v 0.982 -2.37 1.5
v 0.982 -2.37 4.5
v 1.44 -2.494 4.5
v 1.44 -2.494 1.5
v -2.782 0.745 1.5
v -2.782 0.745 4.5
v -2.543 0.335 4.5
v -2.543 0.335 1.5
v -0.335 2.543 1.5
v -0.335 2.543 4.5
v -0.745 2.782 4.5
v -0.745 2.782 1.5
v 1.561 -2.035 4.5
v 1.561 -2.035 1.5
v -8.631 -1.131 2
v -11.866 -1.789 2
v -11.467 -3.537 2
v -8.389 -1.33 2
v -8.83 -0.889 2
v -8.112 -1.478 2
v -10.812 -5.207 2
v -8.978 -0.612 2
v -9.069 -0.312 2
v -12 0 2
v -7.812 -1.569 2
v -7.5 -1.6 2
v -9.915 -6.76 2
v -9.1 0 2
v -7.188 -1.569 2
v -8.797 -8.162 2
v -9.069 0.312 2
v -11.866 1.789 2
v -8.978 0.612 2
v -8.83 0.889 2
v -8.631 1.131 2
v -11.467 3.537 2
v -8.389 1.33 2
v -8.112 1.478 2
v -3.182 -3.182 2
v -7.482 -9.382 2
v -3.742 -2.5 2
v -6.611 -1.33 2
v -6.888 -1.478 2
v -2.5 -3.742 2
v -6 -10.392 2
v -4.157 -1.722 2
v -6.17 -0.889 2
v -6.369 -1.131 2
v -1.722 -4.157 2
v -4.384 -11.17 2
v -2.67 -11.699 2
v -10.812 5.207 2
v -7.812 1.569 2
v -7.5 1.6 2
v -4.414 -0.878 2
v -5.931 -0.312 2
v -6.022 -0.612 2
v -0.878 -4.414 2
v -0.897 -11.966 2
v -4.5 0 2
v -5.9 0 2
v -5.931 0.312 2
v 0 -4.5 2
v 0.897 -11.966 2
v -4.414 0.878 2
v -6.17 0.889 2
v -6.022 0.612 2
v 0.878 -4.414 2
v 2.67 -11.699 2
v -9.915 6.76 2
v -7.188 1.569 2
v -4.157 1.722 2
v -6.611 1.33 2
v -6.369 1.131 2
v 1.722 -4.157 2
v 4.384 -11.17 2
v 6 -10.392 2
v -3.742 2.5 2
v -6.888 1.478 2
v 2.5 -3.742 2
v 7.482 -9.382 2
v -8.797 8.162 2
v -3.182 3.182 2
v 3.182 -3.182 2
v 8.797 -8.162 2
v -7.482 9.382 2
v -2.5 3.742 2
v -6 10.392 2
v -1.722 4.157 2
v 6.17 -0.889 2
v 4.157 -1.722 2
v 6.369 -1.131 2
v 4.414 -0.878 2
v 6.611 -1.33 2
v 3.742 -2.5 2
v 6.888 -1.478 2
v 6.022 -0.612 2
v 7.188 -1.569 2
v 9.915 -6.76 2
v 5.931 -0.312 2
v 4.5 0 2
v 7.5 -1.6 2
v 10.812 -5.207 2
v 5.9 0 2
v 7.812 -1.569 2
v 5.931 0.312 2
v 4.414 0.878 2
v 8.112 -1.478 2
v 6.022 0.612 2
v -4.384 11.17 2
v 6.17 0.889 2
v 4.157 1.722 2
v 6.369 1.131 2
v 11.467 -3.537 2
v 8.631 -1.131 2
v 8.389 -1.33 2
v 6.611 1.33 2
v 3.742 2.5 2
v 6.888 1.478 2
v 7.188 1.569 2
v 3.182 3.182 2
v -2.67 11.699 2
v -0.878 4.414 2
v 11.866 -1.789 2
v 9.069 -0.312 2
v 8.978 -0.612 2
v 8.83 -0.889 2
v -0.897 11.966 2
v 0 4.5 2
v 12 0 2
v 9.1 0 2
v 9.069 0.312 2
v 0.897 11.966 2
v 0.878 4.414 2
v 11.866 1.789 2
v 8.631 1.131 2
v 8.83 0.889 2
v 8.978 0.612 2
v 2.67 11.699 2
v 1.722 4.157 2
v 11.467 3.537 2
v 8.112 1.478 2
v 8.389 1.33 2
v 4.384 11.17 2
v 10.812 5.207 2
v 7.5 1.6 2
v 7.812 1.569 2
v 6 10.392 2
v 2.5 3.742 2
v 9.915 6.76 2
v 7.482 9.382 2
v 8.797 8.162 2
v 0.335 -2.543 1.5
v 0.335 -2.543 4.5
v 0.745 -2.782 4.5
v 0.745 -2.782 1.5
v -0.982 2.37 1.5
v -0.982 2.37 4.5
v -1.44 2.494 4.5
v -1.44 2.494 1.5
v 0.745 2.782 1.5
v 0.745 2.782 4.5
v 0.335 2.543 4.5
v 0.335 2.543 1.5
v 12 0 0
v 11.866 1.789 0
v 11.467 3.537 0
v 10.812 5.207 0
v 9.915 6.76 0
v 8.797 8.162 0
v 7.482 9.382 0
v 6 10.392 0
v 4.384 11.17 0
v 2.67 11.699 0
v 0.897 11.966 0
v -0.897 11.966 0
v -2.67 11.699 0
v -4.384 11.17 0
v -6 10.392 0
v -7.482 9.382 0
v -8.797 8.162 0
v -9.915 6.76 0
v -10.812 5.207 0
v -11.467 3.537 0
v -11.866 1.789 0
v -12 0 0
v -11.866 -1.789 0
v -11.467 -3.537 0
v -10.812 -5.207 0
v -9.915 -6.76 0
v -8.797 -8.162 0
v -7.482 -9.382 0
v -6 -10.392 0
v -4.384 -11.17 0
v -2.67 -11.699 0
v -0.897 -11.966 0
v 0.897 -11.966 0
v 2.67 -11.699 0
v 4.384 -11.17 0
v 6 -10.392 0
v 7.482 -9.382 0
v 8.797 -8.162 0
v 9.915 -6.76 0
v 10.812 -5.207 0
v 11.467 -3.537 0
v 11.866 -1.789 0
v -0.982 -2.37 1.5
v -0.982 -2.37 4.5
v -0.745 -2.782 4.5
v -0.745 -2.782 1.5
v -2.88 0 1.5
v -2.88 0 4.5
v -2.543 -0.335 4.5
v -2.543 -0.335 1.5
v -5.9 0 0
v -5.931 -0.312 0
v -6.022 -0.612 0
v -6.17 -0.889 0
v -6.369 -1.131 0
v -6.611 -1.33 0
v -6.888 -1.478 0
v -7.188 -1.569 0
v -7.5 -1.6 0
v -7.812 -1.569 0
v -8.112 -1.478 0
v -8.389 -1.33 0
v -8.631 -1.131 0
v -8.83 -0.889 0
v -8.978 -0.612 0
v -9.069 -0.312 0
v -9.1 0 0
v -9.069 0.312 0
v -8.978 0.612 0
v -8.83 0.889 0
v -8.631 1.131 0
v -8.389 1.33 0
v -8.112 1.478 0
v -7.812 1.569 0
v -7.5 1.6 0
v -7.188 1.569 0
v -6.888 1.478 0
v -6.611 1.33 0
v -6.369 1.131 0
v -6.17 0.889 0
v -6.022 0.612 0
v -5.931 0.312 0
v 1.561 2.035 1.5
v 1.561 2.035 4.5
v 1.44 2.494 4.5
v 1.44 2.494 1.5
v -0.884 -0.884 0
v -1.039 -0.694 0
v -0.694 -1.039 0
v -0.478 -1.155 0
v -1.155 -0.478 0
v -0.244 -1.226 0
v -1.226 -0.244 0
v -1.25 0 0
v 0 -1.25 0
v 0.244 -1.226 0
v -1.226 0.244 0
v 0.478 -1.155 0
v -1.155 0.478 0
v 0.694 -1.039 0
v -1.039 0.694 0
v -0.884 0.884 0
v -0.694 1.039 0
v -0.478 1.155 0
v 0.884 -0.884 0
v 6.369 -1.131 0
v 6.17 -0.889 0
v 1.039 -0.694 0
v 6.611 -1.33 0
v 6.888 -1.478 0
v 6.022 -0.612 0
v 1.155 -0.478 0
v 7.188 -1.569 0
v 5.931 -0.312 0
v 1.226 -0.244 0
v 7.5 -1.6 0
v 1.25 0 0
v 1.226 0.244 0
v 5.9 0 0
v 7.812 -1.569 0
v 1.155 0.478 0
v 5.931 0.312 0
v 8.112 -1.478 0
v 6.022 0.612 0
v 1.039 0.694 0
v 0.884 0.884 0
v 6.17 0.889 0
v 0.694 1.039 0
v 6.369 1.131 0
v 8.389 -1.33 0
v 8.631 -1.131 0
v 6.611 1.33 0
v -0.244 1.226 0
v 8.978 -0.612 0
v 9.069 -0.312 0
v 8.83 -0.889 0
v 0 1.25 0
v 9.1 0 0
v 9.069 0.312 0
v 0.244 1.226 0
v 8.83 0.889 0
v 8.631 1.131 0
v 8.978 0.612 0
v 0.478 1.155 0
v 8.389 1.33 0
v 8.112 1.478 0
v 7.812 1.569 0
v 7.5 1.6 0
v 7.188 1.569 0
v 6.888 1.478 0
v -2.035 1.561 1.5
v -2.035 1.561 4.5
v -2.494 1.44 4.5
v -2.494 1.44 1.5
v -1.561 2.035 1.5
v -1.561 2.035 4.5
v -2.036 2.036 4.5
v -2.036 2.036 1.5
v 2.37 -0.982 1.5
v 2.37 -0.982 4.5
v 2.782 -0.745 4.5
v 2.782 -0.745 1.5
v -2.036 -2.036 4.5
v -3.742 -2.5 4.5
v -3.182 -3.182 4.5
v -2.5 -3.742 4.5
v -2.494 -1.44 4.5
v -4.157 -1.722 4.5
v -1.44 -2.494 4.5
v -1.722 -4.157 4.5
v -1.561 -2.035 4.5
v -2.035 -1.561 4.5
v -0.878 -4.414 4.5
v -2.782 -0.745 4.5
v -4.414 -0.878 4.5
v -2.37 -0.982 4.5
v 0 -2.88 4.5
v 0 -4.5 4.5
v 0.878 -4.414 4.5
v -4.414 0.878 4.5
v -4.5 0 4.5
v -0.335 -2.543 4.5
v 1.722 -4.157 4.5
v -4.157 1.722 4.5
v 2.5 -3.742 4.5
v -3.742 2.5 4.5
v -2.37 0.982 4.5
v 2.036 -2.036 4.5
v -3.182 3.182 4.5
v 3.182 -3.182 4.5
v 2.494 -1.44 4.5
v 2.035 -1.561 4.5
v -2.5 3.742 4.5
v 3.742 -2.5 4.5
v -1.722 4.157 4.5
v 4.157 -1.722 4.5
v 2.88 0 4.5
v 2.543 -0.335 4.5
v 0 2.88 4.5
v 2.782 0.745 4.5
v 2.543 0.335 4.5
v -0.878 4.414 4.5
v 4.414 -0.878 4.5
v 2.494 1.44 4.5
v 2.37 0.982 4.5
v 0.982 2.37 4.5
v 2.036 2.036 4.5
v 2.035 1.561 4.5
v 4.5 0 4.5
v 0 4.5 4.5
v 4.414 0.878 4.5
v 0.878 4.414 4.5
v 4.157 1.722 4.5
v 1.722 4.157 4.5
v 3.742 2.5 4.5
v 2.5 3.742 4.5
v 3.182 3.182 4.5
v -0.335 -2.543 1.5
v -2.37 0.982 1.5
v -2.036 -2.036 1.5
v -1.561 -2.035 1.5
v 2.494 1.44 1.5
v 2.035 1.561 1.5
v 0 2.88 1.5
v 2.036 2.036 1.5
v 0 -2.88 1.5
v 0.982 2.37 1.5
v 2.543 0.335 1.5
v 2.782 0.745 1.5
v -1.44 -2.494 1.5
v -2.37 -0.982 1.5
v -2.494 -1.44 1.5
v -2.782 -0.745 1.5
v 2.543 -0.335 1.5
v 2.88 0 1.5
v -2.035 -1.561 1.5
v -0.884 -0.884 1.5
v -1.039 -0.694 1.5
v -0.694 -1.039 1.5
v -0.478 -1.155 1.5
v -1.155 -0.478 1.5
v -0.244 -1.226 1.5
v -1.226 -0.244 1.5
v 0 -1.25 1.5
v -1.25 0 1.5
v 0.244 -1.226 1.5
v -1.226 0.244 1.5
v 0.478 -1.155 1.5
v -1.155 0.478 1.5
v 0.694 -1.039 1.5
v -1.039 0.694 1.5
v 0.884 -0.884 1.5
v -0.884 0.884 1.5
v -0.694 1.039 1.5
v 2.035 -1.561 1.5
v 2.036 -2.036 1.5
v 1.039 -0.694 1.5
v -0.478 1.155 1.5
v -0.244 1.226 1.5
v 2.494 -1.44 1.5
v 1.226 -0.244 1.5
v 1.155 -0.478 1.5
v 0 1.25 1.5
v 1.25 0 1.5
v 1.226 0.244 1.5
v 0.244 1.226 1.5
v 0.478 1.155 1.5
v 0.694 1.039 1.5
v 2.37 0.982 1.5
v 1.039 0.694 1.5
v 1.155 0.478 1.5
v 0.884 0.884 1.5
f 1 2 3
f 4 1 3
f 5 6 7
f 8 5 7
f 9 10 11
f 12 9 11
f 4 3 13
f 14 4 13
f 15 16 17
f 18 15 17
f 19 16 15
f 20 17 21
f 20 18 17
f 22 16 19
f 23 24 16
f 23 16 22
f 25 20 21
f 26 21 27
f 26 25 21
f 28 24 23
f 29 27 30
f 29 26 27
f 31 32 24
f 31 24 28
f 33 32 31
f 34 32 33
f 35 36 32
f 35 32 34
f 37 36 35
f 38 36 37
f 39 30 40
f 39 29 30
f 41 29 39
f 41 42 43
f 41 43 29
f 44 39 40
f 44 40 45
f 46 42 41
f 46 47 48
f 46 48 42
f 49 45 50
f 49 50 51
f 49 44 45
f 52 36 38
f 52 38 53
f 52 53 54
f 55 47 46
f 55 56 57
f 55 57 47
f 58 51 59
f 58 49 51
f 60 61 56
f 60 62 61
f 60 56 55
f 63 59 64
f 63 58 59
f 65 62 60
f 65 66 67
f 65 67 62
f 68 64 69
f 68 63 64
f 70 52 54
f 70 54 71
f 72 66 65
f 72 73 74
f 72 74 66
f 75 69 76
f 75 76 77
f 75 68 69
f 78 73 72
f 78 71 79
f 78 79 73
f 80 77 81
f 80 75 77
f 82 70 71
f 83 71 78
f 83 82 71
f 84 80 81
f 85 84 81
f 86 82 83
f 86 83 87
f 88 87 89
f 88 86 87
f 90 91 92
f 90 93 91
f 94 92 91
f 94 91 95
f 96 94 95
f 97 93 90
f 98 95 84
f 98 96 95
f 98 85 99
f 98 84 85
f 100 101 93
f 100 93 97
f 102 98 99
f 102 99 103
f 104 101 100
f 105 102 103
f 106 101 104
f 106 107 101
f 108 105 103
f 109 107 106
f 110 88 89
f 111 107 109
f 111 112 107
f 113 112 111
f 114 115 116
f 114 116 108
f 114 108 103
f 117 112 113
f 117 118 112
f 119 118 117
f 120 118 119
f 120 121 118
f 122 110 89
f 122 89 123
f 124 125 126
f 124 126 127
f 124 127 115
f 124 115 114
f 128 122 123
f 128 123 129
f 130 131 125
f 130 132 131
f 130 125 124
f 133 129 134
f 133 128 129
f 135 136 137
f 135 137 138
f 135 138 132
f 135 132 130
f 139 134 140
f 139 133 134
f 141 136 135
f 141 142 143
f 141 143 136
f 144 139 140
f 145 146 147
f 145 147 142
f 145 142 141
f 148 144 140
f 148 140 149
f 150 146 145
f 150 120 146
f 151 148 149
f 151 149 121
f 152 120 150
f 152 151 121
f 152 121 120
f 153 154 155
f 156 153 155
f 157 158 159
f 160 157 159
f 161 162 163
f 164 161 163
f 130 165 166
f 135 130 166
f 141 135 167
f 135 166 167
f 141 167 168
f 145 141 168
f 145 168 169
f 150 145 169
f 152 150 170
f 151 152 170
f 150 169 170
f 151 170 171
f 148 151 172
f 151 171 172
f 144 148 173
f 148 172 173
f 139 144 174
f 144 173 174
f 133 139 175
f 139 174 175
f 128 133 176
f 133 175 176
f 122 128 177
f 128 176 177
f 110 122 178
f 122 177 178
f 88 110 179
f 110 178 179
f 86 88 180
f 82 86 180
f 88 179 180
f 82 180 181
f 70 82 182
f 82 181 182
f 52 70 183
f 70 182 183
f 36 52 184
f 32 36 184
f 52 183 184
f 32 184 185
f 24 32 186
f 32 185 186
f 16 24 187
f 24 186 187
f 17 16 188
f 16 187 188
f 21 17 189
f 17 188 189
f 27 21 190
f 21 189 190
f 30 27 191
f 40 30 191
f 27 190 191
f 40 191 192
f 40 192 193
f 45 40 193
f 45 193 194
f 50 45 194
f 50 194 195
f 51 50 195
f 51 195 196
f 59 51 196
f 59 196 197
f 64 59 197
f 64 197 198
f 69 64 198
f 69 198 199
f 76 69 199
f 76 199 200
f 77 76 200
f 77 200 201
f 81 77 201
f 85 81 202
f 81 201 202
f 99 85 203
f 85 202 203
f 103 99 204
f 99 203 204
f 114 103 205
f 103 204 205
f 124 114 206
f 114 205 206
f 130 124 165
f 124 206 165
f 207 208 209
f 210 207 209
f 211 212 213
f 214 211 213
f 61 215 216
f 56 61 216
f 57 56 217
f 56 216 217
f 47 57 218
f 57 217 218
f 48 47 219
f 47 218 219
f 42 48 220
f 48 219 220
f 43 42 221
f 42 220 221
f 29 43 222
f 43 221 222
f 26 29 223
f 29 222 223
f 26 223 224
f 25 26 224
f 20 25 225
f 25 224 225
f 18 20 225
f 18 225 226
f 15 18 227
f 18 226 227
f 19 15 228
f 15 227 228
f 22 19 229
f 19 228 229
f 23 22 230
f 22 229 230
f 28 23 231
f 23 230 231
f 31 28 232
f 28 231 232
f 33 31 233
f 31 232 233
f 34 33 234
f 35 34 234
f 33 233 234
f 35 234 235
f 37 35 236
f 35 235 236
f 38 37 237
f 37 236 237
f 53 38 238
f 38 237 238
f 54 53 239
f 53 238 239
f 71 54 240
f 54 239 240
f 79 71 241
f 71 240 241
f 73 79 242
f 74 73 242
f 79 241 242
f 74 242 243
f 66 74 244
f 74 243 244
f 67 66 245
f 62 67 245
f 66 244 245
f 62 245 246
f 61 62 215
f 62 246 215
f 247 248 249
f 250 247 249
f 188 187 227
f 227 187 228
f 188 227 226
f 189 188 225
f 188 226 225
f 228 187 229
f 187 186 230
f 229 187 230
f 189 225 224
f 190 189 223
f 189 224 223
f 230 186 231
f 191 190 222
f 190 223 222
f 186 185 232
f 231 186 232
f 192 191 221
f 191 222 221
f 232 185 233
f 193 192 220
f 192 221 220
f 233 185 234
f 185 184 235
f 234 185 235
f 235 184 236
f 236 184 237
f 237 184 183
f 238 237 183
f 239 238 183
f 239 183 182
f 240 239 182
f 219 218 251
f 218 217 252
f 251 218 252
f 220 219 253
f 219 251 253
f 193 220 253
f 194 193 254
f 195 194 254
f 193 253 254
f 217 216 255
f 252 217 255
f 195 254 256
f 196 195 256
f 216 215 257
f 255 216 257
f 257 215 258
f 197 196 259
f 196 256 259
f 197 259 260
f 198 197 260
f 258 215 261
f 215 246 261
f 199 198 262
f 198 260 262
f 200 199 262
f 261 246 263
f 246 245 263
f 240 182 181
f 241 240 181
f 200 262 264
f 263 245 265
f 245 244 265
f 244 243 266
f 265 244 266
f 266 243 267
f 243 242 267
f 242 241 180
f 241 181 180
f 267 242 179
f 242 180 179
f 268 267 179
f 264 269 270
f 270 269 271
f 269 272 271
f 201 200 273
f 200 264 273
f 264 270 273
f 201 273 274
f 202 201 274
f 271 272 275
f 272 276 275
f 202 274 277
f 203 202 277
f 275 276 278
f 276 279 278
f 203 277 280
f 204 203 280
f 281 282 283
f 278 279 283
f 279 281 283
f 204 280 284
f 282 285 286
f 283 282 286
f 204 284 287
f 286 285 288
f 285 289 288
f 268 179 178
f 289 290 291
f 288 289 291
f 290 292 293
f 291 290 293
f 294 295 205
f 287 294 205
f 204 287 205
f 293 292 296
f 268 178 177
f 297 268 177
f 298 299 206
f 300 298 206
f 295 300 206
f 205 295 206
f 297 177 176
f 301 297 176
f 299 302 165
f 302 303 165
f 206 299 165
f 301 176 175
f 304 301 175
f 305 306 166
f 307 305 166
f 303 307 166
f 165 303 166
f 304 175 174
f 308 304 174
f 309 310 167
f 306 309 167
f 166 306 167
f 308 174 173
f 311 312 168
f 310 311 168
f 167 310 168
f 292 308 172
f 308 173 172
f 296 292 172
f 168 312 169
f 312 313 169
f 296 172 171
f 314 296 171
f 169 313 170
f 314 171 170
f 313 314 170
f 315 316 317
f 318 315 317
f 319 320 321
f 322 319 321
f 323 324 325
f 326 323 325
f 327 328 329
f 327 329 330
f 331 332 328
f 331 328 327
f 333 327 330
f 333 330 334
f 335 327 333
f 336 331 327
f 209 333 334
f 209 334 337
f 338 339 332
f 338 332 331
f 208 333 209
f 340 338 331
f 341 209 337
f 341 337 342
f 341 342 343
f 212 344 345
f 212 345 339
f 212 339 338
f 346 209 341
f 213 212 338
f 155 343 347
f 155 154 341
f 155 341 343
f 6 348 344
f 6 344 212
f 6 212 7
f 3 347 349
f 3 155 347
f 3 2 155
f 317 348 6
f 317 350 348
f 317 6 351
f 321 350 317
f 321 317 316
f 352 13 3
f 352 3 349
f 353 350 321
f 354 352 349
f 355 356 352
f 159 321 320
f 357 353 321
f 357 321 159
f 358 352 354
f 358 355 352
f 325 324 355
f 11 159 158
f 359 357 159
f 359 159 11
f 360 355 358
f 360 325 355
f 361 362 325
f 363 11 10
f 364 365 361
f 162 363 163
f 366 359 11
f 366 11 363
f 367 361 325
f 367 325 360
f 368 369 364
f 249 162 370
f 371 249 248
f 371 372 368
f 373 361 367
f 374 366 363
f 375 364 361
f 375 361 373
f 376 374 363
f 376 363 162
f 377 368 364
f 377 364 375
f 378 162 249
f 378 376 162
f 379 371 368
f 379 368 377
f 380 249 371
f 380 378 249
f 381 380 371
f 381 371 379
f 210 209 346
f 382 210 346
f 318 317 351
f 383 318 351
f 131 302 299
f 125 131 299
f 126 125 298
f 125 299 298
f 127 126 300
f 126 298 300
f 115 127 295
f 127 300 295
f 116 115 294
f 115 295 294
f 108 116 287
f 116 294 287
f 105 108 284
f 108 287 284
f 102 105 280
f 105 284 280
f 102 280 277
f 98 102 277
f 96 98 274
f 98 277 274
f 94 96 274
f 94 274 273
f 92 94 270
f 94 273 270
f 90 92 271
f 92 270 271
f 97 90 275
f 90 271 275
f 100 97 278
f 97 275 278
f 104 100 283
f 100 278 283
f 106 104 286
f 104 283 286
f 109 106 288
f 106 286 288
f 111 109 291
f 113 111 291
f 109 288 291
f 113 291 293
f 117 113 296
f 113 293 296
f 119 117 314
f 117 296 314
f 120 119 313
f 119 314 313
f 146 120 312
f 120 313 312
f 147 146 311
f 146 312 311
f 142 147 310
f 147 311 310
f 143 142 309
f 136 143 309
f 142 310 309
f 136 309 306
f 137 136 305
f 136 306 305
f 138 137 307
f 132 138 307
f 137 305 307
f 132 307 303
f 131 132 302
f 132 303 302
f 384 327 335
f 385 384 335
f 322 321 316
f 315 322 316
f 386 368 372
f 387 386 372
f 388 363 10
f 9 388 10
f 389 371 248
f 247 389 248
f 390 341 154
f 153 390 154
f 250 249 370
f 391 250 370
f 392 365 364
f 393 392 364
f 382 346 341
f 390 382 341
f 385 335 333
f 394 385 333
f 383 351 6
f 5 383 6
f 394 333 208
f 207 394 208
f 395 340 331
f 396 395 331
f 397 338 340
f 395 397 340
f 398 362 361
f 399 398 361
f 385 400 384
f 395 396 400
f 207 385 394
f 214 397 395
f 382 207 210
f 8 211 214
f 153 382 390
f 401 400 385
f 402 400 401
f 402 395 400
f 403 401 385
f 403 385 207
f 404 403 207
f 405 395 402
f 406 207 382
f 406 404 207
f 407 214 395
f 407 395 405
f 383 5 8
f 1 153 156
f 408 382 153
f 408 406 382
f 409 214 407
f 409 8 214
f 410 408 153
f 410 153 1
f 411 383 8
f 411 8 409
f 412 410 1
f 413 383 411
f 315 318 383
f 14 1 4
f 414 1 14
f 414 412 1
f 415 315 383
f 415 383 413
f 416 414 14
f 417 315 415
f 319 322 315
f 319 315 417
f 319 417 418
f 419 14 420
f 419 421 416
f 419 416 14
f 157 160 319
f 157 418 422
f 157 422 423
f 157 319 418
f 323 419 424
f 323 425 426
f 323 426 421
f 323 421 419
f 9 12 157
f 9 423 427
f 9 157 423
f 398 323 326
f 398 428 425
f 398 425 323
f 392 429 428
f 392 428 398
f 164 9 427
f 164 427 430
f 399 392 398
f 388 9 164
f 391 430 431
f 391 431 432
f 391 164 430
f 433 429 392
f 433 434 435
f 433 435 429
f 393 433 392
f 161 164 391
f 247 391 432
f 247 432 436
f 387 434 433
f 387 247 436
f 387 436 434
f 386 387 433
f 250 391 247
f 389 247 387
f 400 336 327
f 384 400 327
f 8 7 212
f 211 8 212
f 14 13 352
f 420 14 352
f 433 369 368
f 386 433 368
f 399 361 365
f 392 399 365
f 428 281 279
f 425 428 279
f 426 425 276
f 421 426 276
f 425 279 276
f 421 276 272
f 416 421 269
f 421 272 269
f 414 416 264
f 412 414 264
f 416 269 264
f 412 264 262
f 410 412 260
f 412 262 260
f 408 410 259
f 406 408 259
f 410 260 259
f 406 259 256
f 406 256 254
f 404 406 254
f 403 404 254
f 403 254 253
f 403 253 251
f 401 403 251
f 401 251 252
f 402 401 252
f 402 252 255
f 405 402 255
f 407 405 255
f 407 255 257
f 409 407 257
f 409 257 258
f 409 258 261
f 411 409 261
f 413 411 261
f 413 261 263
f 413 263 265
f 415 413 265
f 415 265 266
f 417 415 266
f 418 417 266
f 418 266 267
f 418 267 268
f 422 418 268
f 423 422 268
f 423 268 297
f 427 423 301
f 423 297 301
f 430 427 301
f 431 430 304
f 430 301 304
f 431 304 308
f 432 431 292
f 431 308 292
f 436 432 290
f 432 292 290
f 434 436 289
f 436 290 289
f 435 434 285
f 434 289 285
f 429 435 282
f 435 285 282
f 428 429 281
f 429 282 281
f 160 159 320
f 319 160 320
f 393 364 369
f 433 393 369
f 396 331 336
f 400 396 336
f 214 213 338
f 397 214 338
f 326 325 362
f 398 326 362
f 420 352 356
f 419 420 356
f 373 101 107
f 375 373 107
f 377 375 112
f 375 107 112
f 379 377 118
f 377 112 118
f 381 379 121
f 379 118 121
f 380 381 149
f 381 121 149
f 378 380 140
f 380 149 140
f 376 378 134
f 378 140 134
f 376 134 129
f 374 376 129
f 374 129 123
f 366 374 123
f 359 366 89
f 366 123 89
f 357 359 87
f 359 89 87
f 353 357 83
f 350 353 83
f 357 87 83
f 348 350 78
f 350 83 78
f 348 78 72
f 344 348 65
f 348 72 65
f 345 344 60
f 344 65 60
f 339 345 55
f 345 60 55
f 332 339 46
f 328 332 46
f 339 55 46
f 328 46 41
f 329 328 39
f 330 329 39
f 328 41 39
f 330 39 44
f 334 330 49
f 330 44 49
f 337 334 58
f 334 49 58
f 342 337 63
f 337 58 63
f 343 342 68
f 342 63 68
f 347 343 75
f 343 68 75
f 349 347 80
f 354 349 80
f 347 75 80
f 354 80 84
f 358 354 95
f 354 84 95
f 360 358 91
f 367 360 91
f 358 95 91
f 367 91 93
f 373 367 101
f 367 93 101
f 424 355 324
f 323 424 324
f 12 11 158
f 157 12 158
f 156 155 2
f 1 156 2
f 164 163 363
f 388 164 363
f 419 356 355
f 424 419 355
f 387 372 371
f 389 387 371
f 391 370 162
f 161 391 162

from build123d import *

# Parameters (mm, degrees)
F0_R            = 12
F1_DEPTH        = 2
F2_R            = 4.5
F3_DEPTH        = 2.5
F4_R            = 2.565
F5_DEPTH        = 3
F7_DEPTH        = 3
F7_COPIES_COUNT = 24
F8_R            = 1.25
F9_DEPTH        = 4.501
F10_R           = 1.6
F11_DEPTH       = 2


# Not quite as in the source:
# - a pattern or mirror of a feature is missing from the dataset's text; its kind, count and spacing are read off the source's solid


with BuildPart() as f1:
    # F0 (on Top) → F1 (new body)
    with BuildSketch(Plane.XY):
        Circle(F0_R)
    extrude(amount=F1_DEPTH)

    # F2 (on face) → F3 (join)
    with BuildSketch(Plane.XY.offset(2)):
        Circle(F2_R)
    extrude(amount=F3_DEPTH)

    # F4 (on face) → F5 (cut)
    with BuildSketch(Plane.XY.offset(4.5)):
        Circle(F4_R)
    extrude(amount=-F5_DEPTH, mode=Mode.SUBTRACT)

    # F6 (on face) → F7 (cut, through all)
    with BuildSketch(Plane.XY.offset(4.5)):
        with BuildLine():
            Line((0, 2.88), (-0.334799683, 2.5430560694))
            ThreePointArc((-0.334799683, 2.5430560694), (0, 2.565), (0.334799683, 2.5430560694))
            Line((0.334799683, 2.5430560694), (0, 2.88))
        make_face()
    f7 = extrude(amount=-F7_DEPTH, mode=Mode.SUBTRACT)

    # F7_copies: F7 ×24 about axis
    f7_copies_axis = Axis((0, 0, 0), (0, 0, 1))
    for i in range(1, F7_COPIES_COUNT):
        add(f7.rotate(f7_copies_axis, i * 360 / F7_COPIES_COUNT), mode=Mode.SUBTRACT)

    # F8 (on face) → F9 (cut, through all)
    with BuildSketch(Plane(origin=(0, 0, 0), x_dir=(1, 0, 0), z_dir=(0, 0, -1))):
        Circle(F8_R)
    extrude(amount=-F9_DEPTH, mode=Mode.SUBTRACT)

    # F10 (on face) → F11 (cut, through all)
    with BuildSketch(Plane(origin=(0, 0, 0), x_dir=(1, 0, 0), z_dir=(0, 0, -1))):
        with Locations((-7.5, 0)):
            Circle(F10_R)
        with Locations((7.5, 0)):
            Circle(F10_R)
    extrude(amount=-F11_DEPTH, mode=Mode.SUBTRACT)


solid = f1.part
